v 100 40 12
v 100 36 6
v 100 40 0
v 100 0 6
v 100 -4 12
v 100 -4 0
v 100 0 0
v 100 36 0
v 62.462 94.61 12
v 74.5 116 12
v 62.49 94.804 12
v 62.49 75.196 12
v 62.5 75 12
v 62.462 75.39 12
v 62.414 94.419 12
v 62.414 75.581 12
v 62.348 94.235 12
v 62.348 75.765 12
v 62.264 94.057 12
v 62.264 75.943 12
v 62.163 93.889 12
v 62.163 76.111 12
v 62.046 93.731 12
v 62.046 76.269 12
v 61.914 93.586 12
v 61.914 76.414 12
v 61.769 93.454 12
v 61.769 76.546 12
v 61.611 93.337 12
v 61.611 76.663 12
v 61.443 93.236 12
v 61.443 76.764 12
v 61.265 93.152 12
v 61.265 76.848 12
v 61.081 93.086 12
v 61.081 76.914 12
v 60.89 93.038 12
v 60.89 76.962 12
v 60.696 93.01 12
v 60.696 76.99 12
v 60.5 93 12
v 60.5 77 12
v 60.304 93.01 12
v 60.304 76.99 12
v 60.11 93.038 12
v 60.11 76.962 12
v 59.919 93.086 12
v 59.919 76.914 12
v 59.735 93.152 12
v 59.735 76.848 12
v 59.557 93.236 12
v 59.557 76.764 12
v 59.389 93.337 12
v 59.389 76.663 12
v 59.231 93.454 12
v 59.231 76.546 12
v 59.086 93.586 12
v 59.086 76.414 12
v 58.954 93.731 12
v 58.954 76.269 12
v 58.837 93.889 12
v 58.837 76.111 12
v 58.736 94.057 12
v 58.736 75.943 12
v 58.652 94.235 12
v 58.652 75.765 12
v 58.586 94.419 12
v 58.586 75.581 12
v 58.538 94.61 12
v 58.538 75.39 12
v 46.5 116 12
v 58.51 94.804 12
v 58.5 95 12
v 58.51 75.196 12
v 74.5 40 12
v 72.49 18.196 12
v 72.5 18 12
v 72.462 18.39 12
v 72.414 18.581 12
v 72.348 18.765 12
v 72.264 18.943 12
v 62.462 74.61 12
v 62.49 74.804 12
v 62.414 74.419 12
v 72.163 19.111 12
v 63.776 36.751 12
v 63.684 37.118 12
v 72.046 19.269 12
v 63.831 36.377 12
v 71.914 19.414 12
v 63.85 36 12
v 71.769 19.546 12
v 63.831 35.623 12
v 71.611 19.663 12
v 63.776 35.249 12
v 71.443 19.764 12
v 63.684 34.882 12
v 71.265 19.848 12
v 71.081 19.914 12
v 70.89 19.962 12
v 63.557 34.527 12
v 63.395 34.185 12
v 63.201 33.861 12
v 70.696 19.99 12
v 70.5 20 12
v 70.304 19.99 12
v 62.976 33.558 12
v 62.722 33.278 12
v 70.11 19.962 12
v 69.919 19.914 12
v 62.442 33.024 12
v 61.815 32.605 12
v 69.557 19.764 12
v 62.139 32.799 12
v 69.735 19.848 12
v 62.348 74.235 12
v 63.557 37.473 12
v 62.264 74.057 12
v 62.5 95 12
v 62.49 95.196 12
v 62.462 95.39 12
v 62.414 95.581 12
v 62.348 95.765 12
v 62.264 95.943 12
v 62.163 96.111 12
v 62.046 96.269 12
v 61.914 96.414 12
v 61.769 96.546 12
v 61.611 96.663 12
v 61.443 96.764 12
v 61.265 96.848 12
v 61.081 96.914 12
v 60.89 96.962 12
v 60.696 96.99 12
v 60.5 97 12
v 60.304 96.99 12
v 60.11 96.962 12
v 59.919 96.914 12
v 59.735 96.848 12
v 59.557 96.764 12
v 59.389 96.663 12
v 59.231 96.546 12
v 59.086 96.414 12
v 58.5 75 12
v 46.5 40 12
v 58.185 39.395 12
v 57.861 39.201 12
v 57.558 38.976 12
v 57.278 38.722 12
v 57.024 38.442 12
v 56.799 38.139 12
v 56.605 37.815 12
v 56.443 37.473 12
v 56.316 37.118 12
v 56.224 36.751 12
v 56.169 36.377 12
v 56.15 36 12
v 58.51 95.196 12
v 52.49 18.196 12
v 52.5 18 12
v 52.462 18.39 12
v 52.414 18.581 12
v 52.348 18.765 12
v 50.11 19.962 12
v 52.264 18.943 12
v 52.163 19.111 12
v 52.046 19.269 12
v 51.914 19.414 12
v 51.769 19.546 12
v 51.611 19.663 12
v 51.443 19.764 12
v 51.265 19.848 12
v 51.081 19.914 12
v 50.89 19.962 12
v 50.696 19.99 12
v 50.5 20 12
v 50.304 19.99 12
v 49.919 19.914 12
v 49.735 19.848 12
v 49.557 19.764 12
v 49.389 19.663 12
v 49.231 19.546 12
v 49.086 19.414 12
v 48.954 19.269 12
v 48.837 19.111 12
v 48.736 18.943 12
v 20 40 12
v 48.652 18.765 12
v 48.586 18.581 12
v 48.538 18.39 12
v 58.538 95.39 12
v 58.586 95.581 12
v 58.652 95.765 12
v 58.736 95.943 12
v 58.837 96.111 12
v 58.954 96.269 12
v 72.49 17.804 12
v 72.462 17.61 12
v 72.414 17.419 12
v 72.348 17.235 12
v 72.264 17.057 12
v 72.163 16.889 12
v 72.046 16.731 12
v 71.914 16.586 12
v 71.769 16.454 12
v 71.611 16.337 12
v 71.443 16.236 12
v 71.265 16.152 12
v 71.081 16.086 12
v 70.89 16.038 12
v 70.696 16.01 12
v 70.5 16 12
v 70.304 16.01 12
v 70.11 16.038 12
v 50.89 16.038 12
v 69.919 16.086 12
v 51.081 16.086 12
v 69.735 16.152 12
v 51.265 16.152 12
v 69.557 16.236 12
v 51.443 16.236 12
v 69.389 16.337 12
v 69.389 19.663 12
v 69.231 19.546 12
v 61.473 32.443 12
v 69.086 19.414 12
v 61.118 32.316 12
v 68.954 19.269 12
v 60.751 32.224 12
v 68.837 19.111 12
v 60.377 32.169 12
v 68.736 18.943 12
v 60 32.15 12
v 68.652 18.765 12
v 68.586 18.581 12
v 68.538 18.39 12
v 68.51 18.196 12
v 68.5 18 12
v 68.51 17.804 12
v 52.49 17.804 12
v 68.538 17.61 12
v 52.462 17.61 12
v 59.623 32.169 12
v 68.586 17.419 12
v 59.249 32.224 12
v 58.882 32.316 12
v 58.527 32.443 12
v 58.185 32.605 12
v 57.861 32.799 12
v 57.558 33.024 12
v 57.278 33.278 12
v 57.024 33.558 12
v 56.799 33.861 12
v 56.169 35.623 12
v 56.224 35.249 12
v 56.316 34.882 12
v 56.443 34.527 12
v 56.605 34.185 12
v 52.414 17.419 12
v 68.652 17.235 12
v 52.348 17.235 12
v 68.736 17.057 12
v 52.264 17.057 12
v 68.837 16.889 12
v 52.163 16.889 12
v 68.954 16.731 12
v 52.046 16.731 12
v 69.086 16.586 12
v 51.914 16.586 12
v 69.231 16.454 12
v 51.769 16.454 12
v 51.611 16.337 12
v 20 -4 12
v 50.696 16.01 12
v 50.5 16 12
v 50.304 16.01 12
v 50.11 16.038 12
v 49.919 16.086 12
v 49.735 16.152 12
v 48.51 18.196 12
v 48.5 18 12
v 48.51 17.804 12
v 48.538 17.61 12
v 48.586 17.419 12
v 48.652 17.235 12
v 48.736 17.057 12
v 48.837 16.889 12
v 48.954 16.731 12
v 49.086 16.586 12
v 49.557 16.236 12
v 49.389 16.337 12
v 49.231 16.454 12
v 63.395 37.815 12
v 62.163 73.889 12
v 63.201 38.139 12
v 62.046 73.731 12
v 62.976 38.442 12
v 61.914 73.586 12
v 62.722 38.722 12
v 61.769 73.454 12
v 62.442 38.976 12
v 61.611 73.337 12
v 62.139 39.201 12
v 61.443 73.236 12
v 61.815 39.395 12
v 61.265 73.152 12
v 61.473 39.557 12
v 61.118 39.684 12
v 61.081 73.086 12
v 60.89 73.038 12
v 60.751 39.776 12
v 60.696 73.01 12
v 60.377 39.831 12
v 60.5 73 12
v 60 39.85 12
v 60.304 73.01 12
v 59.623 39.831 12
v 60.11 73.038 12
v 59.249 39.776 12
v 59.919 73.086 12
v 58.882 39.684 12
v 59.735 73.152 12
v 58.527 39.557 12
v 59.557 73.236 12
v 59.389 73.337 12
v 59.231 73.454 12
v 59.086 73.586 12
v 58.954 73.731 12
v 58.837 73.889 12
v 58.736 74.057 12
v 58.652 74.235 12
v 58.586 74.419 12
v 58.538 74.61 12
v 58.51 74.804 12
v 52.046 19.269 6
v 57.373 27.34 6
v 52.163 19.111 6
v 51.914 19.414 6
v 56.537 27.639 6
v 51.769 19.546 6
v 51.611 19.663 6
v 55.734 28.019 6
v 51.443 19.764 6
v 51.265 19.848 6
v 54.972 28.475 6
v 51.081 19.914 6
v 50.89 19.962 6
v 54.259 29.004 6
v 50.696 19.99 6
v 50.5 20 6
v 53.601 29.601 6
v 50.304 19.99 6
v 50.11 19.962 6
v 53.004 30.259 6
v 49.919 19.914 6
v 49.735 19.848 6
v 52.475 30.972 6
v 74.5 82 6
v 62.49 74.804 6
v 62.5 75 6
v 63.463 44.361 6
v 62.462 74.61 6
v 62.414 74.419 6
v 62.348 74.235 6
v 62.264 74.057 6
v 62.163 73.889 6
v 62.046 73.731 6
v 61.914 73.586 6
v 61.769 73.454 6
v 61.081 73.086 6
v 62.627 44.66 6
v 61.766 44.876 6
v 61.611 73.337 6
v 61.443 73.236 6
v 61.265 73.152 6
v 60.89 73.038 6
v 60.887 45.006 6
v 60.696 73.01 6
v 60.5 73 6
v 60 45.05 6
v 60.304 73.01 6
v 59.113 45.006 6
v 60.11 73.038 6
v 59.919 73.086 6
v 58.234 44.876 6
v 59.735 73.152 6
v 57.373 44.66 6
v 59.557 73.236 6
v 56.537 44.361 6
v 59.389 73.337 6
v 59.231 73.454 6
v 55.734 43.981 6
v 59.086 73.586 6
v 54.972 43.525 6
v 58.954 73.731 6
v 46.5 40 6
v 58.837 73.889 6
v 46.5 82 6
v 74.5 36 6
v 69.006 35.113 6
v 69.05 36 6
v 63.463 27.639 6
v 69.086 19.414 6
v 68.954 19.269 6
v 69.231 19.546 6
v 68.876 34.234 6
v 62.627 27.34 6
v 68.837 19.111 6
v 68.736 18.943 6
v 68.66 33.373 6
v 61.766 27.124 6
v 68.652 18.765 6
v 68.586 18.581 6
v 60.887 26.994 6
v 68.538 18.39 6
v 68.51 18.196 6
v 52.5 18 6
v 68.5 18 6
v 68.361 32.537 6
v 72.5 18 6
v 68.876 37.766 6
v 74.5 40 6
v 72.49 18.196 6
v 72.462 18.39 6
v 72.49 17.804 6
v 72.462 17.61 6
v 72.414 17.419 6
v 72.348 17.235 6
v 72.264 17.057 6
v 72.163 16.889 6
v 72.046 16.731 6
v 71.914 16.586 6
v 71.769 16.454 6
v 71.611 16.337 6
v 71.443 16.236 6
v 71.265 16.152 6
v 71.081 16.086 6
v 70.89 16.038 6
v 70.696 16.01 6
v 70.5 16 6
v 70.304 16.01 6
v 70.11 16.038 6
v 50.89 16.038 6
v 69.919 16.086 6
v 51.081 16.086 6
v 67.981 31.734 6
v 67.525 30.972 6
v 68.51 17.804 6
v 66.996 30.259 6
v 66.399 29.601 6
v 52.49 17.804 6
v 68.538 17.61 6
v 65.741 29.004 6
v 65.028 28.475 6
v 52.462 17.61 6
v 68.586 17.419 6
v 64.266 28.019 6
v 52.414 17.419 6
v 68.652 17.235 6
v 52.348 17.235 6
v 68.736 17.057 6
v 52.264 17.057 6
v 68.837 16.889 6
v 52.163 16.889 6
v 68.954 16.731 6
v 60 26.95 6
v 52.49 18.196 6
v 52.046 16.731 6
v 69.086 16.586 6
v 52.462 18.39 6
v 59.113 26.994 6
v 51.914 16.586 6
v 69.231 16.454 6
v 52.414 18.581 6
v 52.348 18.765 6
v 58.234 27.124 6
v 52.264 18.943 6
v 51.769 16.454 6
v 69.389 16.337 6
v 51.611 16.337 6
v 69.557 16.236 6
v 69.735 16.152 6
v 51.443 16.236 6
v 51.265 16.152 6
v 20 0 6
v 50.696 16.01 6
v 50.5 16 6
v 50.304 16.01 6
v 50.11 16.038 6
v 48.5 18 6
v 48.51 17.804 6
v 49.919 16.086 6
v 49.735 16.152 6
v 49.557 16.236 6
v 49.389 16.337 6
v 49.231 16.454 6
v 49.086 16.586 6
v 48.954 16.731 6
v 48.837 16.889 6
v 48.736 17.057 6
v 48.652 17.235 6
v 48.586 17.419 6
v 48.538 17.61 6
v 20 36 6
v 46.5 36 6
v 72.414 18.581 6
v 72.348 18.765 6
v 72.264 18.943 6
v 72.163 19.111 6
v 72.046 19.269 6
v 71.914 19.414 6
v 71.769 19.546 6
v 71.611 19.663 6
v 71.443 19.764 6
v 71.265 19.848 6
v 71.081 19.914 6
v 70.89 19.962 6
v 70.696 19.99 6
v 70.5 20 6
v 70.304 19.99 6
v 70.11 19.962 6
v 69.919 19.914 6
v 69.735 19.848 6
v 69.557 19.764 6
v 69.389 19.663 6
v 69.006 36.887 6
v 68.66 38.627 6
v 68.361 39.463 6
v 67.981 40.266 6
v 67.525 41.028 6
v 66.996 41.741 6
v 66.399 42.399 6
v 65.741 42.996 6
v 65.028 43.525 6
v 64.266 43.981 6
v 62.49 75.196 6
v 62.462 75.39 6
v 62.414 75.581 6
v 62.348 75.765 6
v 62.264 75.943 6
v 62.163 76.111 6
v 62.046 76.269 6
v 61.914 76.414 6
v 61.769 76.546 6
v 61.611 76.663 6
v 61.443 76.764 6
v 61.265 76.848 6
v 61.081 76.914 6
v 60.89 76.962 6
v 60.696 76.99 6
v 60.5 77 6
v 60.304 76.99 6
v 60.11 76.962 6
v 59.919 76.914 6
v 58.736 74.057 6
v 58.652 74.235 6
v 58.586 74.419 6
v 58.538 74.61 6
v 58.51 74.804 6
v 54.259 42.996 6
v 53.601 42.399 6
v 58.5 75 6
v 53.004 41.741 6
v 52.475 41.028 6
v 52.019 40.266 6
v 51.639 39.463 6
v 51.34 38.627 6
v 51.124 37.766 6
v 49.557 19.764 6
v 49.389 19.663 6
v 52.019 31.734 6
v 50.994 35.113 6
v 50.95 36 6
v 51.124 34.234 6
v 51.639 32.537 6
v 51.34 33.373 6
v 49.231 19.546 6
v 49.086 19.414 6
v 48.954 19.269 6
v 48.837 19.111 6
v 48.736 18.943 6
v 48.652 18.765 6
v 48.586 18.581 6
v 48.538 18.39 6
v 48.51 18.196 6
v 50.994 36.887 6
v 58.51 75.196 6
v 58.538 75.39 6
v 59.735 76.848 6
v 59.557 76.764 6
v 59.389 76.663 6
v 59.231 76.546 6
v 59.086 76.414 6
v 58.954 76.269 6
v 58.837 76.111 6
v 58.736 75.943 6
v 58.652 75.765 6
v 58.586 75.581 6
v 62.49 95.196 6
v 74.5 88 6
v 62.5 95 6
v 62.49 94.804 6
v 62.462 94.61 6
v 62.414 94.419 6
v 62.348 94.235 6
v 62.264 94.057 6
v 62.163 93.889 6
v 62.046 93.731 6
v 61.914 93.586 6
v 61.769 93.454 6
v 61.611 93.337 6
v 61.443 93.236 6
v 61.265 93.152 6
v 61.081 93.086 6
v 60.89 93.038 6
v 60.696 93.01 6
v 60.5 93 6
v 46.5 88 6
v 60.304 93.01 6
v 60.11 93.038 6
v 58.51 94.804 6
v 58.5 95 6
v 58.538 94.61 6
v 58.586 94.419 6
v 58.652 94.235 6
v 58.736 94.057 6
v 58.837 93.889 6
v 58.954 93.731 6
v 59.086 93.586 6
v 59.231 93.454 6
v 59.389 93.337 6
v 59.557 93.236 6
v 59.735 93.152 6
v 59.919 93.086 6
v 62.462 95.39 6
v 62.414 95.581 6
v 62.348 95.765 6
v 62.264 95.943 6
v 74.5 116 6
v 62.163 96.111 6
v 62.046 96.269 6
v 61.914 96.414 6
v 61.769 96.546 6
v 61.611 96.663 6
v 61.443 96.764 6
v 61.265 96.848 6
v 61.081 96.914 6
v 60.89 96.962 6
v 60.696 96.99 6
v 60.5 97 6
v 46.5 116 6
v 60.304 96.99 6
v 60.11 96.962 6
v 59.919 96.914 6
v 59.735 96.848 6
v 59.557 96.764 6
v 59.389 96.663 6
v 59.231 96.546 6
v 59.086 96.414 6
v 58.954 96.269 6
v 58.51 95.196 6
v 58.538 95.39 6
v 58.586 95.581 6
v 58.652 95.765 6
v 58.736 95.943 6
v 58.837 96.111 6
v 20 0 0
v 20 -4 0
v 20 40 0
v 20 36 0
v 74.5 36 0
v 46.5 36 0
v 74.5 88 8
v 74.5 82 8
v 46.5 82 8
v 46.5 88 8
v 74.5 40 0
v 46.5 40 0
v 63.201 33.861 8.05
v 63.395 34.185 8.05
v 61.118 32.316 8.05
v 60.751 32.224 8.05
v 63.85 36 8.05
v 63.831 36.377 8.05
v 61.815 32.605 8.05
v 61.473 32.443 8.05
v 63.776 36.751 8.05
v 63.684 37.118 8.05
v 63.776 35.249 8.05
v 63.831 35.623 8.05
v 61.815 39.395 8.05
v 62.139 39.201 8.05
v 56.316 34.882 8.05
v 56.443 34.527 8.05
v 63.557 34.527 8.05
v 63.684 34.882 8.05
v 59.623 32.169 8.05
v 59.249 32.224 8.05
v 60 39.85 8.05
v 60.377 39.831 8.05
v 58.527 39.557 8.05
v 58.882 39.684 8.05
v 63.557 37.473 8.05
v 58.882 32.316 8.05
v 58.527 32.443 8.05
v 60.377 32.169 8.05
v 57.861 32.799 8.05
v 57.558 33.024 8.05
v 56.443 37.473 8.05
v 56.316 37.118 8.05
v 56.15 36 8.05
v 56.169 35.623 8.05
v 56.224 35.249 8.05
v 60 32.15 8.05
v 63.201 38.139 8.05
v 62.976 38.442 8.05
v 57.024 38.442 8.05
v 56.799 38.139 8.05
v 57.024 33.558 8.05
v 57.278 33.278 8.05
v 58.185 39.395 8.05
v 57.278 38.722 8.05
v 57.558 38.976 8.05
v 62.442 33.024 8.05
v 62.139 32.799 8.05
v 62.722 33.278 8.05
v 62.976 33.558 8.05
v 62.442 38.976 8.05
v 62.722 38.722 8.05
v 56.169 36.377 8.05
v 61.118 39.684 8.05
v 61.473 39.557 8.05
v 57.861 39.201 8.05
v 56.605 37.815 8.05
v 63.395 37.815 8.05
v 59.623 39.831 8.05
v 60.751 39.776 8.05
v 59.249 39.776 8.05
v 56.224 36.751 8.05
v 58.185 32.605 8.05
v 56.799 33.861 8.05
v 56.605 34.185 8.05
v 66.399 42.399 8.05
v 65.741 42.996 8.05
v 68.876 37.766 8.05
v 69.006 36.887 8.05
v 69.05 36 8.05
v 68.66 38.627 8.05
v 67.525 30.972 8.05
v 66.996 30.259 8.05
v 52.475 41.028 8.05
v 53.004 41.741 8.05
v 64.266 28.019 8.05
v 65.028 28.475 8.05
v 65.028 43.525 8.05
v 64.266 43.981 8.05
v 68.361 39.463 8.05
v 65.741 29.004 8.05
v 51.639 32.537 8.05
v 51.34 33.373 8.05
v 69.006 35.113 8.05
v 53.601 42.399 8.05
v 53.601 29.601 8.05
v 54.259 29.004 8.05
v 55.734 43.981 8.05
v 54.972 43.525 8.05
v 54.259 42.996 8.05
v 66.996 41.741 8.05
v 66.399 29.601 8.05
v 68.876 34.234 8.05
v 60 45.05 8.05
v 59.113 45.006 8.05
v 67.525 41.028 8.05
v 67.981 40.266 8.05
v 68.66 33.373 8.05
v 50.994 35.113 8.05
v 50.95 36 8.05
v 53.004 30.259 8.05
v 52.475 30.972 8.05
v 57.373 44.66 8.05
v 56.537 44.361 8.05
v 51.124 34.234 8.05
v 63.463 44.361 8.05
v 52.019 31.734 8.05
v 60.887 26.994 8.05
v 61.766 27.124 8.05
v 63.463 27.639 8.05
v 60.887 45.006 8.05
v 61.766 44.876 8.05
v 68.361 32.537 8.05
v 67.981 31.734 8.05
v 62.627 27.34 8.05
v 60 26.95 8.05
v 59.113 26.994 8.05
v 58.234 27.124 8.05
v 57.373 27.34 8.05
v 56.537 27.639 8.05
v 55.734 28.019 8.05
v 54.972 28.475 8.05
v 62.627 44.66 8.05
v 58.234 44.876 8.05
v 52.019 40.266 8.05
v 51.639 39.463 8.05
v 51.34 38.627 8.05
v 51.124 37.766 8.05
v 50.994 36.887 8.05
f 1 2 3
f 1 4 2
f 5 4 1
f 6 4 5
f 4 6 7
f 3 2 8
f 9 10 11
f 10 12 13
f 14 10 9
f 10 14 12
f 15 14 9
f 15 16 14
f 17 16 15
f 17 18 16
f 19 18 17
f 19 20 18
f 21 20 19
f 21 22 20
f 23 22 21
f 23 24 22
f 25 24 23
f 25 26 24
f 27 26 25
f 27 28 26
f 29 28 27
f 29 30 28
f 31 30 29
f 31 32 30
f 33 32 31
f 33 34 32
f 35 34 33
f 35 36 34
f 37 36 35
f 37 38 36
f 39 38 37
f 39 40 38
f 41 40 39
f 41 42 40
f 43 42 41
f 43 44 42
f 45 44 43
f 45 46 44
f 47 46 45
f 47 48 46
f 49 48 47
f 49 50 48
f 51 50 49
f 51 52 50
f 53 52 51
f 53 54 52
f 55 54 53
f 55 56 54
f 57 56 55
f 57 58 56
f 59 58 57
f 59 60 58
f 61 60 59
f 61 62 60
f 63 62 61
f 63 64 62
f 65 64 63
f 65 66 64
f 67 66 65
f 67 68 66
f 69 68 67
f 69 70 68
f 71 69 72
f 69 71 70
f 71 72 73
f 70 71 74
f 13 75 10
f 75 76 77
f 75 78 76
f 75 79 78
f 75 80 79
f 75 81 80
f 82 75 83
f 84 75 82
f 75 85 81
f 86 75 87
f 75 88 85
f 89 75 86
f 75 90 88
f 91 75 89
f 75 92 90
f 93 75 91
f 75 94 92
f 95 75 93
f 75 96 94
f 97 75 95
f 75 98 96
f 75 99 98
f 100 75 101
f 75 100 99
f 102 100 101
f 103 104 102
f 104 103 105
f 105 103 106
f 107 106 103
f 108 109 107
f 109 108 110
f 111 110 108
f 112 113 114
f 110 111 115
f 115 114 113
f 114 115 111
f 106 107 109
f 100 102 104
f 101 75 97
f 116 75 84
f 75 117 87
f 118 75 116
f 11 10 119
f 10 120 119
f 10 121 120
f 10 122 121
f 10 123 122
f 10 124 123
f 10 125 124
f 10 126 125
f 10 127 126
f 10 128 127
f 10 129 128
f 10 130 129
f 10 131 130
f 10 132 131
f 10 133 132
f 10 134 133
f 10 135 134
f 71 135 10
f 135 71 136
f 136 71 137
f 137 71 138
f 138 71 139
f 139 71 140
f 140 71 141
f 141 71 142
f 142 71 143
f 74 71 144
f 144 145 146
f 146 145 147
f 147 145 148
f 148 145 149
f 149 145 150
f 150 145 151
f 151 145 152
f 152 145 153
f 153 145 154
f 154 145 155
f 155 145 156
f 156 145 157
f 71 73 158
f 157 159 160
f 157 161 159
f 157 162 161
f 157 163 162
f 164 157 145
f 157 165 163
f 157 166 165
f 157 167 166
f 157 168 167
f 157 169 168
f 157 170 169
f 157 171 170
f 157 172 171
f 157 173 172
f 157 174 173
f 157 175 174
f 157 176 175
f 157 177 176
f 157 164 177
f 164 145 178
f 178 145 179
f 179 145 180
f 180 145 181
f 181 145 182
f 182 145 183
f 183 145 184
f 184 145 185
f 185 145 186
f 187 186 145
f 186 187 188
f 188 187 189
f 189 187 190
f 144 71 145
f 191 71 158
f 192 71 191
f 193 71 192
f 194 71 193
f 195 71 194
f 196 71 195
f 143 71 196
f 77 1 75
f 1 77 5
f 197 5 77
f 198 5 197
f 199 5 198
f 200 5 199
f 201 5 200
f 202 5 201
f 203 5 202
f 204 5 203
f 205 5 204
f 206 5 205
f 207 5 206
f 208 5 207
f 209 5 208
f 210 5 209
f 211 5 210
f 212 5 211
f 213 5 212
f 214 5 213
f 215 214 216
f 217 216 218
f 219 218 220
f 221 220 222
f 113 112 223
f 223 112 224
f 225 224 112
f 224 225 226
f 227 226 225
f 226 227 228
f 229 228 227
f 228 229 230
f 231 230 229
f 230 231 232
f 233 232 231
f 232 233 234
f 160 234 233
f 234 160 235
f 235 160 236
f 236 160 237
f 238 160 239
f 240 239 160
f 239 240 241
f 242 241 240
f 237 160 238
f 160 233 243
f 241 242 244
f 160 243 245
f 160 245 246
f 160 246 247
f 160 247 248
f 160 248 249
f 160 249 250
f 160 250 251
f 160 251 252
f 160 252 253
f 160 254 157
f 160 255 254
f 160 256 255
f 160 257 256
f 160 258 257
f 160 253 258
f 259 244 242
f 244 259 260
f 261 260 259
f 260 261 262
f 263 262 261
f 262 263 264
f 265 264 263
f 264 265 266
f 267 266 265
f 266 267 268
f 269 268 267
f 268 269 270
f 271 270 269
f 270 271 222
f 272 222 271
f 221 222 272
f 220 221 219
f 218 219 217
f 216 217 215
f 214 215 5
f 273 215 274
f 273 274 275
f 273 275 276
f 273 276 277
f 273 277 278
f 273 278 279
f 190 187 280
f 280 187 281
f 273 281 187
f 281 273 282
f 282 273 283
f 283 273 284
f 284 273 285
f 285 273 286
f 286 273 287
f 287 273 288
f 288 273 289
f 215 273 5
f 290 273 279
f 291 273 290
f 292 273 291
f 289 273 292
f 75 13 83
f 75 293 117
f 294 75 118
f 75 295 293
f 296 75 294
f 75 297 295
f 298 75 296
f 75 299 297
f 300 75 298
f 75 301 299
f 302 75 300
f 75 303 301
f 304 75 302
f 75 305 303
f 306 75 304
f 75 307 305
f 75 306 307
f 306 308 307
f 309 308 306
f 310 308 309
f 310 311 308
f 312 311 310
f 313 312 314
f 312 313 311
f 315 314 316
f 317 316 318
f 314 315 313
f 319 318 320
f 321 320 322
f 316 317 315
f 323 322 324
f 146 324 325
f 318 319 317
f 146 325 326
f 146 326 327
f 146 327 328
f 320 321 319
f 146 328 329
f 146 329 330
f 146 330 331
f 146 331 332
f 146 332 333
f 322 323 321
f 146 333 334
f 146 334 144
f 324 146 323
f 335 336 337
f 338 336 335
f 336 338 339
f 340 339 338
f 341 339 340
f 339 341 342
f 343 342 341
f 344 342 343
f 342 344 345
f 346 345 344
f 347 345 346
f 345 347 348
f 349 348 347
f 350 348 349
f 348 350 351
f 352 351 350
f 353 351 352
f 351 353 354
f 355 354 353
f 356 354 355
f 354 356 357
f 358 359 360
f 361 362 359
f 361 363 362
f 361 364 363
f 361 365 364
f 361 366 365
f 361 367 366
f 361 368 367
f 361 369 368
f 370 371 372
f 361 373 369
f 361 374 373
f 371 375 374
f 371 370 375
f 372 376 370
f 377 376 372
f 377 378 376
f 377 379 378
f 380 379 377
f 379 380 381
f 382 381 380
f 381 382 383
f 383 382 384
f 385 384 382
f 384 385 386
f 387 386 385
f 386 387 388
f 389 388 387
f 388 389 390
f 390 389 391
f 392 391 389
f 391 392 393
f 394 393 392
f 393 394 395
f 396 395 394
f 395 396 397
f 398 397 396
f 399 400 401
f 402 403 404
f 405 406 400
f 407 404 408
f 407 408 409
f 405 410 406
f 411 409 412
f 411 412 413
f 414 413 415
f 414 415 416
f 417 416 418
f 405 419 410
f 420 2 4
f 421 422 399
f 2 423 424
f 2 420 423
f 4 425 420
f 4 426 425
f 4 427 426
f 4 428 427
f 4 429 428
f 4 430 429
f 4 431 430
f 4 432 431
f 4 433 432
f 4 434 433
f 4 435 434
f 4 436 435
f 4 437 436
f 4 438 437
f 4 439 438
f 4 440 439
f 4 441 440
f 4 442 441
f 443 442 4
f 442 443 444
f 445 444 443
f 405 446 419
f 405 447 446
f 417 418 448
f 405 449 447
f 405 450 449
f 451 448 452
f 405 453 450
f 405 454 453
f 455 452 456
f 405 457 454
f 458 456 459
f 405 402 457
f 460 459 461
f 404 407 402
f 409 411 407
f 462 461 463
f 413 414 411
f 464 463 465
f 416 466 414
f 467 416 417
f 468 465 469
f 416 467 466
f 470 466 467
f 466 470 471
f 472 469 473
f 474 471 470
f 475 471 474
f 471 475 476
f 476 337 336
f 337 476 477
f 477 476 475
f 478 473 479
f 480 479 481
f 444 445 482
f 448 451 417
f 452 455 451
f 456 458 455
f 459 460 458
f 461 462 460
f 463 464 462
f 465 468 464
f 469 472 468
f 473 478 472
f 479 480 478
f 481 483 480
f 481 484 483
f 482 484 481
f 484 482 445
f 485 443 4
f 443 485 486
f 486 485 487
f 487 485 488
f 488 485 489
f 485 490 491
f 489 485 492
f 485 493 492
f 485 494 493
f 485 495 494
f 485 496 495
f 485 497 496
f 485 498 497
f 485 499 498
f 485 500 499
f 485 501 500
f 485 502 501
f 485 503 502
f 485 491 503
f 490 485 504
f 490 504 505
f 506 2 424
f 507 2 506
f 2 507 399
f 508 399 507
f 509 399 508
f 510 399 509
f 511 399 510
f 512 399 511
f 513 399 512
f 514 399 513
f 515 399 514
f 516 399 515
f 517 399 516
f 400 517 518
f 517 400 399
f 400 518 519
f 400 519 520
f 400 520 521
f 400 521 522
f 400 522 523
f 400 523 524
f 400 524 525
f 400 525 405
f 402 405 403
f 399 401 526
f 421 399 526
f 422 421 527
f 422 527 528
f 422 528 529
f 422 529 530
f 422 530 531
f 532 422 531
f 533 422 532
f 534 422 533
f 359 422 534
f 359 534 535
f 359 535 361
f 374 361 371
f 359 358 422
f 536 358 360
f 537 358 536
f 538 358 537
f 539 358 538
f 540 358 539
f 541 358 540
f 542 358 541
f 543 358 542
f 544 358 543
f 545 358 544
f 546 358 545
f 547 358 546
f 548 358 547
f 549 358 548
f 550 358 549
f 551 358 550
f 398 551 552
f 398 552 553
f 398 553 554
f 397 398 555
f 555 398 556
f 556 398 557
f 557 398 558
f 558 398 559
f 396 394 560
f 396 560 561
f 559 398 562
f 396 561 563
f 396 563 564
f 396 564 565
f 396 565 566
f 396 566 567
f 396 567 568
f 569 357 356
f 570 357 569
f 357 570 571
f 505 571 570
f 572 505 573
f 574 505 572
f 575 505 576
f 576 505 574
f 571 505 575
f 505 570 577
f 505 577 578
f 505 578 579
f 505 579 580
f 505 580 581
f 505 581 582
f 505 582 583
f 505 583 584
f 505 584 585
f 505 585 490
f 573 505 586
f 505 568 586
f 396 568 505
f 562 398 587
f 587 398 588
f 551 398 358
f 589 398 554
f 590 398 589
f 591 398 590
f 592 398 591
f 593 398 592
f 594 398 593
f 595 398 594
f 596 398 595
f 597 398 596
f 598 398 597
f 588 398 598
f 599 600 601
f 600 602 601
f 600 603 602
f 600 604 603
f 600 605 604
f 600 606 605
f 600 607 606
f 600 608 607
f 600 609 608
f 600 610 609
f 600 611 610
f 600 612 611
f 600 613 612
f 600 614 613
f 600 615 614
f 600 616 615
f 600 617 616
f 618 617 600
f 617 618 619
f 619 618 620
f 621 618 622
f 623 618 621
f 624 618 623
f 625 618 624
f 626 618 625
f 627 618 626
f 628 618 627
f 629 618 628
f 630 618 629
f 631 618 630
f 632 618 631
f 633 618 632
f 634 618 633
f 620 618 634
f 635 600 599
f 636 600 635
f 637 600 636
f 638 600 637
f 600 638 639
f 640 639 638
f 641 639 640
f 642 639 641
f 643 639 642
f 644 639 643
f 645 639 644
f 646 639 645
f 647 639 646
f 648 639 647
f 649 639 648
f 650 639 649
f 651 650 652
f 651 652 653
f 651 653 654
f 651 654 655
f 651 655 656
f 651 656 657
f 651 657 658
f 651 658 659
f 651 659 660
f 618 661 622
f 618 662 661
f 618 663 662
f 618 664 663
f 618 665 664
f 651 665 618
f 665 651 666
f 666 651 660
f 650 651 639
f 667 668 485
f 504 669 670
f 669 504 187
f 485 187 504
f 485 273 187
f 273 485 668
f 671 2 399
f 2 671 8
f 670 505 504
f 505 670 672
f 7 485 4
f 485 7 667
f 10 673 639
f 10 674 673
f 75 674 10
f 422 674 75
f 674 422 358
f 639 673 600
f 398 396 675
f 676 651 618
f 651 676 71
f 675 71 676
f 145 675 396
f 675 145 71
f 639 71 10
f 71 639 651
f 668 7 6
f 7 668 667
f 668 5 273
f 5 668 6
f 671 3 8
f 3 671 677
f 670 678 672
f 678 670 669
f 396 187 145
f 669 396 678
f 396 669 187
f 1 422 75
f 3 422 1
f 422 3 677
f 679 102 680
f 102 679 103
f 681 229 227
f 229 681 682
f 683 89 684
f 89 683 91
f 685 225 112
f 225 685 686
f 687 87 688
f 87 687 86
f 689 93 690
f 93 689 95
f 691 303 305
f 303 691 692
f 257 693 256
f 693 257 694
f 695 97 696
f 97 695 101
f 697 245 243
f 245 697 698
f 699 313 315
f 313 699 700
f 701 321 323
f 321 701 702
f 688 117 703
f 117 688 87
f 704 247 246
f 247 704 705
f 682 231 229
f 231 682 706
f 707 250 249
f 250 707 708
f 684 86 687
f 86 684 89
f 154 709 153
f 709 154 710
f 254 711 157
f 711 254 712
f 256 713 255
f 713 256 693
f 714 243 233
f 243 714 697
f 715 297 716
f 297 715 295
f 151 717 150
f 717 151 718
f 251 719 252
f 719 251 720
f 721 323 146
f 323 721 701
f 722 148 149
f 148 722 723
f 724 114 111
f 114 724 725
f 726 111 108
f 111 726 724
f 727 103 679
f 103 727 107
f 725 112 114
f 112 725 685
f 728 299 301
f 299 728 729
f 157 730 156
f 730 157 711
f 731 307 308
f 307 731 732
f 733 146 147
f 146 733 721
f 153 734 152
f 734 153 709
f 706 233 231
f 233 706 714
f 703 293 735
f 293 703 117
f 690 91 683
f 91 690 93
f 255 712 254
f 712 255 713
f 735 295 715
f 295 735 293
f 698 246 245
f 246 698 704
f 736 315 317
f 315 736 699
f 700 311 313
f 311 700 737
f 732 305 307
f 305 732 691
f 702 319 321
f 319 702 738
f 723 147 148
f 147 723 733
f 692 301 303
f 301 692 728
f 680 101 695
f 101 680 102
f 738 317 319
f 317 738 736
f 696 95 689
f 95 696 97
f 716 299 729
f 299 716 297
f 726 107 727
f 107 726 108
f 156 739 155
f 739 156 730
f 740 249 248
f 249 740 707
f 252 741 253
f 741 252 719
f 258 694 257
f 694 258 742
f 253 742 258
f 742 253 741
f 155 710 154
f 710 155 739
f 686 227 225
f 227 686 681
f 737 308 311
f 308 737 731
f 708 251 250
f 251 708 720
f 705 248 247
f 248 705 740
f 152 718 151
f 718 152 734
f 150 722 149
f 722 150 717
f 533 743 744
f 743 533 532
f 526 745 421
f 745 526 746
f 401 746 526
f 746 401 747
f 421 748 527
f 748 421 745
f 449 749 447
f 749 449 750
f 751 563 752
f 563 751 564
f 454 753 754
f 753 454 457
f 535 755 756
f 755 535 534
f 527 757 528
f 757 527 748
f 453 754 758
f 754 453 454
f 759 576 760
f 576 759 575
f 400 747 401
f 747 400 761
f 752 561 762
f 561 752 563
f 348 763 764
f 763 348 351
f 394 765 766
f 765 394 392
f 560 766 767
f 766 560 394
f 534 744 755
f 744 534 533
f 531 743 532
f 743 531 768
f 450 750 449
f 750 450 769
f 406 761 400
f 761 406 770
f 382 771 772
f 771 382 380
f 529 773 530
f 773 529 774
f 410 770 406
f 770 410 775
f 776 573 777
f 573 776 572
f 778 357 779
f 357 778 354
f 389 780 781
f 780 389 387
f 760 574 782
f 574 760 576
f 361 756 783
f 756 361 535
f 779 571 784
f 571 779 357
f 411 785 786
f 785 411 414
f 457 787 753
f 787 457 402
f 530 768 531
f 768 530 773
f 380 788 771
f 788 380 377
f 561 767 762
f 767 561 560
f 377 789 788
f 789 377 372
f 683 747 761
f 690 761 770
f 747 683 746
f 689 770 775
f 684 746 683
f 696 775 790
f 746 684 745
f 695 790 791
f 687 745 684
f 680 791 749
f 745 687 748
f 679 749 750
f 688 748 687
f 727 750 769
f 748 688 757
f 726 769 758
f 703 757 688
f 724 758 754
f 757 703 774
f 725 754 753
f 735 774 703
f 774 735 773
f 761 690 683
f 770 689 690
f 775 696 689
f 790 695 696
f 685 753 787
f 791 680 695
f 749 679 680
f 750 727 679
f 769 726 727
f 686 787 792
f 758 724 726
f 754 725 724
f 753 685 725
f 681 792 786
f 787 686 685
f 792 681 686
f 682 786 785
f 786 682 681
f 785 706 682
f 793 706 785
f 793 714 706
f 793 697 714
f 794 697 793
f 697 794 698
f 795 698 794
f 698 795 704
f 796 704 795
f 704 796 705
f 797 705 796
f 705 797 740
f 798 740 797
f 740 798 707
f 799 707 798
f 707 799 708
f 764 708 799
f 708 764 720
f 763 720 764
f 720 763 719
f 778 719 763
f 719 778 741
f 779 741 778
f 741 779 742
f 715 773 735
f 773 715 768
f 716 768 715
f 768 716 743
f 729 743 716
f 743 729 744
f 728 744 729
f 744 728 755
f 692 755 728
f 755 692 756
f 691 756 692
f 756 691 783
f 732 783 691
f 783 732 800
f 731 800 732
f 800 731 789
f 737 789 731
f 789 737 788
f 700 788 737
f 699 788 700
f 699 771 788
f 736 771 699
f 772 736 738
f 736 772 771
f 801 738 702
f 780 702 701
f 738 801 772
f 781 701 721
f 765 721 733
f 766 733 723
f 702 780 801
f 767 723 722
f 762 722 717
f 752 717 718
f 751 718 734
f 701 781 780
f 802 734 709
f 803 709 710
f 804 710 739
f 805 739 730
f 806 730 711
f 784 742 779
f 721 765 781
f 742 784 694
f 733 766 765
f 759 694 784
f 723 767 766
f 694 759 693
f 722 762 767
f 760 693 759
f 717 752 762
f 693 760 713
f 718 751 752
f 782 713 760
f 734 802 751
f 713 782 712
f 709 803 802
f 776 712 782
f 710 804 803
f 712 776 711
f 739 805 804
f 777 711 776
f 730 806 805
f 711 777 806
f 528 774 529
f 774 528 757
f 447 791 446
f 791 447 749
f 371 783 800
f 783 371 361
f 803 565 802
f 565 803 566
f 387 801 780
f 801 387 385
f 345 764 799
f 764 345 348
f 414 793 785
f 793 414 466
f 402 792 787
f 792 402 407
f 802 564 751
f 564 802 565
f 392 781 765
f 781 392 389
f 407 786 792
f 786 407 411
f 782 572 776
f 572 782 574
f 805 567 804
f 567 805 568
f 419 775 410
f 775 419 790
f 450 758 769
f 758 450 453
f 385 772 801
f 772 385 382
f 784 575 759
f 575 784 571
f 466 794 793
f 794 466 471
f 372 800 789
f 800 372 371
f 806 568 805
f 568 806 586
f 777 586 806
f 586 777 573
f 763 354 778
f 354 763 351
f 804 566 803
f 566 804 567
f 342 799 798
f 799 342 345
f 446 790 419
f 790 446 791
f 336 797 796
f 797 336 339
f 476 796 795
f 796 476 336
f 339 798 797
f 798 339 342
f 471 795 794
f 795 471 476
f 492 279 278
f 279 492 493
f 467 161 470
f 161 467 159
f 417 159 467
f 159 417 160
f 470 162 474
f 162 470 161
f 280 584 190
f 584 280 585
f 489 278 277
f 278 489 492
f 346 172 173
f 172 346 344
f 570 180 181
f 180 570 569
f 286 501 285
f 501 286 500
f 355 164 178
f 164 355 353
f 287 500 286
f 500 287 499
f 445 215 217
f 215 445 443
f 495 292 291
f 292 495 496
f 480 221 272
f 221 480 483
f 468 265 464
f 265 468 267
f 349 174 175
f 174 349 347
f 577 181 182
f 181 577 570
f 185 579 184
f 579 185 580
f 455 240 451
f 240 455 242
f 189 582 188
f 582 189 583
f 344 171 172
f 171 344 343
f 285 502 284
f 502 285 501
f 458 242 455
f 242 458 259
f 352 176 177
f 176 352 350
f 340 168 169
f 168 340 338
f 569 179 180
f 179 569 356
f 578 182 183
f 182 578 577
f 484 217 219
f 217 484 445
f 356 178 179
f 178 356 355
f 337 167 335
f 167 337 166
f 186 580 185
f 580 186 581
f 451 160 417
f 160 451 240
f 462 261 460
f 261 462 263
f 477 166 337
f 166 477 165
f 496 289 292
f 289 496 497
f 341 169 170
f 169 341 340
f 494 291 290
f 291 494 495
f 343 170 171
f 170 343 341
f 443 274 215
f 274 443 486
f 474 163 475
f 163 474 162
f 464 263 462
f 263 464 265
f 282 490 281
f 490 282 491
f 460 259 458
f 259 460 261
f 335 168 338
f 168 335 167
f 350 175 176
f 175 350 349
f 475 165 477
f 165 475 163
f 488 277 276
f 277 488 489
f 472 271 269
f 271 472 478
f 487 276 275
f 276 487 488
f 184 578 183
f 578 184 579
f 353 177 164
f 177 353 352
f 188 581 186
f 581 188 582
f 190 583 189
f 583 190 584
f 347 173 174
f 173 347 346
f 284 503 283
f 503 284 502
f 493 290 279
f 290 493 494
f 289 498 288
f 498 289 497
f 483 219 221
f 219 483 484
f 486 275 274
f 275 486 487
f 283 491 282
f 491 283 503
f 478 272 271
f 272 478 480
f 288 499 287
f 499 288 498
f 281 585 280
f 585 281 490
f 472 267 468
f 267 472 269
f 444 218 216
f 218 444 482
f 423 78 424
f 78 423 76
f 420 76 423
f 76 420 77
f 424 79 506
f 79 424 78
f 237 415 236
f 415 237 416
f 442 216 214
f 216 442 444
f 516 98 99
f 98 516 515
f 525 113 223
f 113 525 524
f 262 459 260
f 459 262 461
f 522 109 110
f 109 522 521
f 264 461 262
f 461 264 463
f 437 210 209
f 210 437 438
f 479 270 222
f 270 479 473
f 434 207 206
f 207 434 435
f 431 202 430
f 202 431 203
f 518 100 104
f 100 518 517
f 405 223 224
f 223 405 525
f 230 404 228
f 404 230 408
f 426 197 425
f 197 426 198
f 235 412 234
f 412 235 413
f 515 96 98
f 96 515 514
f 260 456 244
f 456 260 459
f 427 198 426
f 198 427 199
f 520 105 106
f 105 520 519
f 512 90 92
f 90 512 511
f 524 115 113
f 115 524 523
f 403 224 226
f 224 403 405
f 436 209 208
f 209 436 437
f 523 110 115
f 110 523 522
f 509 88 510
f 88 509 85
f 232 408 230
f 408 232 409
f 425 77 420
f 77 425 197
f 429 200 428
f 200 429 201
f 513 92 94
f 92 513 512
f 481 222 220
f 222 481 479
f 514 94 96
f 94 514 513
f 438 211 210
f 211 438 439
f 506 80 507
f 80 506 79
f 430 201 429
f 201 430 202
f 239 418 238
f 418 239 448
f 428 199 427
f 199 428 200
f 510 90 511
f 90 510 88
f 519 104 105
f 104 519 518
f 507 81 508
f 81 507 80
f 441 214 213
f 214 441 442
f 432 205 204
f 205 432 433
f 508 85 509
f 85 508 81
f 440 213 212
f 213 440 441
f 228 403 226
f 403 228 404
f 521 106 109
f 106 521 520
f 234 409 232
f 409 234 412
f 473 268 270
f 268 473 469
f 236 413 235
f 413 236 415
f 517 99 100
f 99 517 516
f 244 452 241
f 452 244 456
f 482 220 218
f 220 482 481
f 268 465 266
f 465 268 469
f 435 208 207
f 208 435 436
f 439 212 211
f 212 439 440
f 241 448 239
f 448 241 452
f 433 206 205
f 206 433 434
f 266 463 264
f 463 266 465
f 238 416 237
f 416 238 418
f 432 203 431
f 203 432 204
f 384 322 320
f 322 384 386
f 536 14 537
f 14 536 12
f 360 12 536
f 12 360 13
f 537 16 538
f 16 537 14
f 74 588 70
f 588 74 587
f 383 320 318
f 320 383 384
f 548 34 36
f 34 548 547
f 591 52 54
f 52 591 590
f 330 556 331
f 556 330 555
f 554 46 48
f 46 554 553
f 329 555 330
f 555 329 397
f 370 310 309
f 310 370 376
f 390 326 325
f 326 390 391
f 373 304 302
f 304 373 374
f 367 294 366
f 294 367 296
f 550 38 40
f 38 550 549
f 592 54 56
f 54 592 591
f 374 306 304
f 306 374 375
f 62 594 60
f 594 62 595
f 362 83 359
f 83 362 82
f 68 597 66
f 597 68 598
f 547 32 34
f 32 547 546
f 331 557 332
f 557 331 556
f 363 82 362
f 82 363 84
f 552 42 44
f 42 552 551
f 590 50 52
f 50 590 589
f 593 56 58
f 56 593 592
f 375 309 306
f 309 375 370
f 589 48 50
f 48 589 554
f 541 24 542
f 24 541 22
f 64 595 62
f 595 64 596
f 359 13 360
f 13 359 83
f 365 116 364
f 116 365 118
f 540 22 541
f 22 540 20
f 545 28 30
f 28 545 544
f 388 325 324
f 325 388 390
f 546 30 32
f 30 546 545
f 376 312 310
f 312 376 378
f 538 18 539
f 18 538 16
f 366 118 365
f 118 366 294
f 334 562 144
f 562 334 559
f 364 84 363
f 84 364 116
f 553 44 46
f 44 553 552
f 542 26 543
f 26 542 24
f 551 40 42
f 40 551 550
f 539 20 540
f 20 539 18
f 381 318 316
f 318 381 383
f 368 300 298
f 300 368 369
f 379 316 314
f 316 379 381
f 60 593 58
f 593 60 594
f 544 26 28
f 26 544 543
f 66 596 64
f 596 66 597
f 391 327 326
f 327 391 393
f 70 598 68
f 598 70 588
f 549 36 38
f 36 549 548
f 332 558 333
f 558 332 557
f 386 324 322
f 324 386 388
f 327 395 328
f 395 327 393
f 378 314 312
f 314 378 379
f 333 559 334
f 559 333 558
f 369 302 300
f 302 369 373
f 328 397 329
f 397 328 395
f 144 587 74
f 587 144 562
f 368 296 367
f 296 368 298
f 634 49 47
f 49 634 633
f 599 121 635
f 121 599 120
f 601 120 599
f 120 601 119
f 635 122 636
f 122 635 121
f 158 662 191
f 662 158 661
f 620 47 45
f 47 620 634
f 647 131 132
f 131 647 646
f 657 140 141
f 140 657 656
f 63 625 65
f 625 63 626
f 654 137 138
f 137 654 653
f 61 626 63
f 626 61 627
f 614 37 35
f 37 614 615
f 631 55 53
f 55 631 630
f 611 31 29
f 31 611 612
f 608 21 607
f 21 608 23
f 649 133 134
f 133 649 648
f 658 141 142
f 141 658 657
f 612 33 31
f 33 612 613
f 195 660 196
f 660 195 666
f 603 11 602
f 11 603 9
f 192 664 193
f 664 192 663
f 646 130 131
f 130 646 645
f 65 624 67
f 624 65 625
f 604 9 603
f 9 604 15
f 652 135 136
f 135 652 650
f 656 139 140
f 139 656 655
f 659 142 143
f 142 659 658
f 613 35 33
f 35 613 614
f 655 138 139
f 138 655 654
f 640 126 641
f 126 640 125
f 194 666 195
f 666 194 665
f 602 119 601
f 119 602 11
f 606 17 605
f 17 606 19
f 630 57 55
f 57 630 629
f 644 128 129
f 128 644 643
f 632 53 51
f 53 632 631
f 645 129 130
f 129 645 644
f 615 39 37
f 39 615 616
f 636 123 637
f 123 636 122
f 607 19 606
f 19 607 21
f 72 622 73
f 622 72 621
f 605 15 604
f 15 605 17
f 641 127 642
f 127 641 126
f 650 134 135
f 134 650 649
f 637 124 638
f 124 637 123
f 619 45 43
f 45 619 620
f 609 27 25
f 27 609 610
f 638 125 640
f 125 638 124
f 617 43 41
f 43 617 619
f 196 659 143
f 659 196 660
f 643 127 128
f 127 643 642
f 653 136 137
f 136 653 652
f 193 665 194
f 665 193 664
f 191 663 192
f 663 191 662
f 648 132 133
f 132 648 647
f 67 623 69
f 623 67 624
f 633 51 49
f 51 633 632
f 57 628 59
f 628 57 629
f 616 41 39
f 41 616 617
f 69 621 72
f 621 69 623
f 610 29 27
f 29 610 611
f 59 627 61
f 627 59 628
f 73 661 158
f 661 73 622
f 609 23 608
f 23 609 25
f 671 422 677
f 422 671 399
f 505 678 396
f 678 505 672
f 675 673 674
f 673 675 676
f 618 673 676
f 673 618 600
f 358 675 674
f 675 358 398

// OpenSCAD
difference(){
    union(){


        color("green")
        translate([20,0,6])
        cube([80,36,6]);
        translate([(121/2-14),36,6])
        cube([28,80,6]);

        color("red")
        translate([20,-4,0])
        cube([80,4,12]);

        color("blue")
        translate([20,36,0])
        cube([80,4,12]);
        // color("teal")
        // translate([74,36,0])
        // cube([26,4,12]);
        }
$fn=64;
    union(){
        translate([(121/2-10),18,30])
        cylinder(h=60,d=4,center=true);
        translate([(121/2+10),18,30])
        cylinder(h=60,d=4,center=true);
        translate([121/2,75,30])
        cylinder(h=60,d=4,center=true);
        translate([121/2,95,30])
        cylinder(h=60,d=4,center=true);
        translate([4,0,0])
        cube([113,36,6]);
        translate([(121/2-14),36,0])
        cube([28,80,6]);
        translate([60,36,17])
        union(){
            // cube([21.3,19.25,12],center=true);
            cylinder(h=40,d=7.7,center=true);
            translate([0,0,-10])
            cylinder(h=2.1,d=18.1,center=true);
            }
        translate([121/2,85,6])
        cube([30,6,4],center=true);
    }
}
// $fn=64;
// translate([60,36,17])
// difference(){
// cube([21.3,19.25,12],center=true);
// #cylinder(h=40,d=7,center=true);
// }
